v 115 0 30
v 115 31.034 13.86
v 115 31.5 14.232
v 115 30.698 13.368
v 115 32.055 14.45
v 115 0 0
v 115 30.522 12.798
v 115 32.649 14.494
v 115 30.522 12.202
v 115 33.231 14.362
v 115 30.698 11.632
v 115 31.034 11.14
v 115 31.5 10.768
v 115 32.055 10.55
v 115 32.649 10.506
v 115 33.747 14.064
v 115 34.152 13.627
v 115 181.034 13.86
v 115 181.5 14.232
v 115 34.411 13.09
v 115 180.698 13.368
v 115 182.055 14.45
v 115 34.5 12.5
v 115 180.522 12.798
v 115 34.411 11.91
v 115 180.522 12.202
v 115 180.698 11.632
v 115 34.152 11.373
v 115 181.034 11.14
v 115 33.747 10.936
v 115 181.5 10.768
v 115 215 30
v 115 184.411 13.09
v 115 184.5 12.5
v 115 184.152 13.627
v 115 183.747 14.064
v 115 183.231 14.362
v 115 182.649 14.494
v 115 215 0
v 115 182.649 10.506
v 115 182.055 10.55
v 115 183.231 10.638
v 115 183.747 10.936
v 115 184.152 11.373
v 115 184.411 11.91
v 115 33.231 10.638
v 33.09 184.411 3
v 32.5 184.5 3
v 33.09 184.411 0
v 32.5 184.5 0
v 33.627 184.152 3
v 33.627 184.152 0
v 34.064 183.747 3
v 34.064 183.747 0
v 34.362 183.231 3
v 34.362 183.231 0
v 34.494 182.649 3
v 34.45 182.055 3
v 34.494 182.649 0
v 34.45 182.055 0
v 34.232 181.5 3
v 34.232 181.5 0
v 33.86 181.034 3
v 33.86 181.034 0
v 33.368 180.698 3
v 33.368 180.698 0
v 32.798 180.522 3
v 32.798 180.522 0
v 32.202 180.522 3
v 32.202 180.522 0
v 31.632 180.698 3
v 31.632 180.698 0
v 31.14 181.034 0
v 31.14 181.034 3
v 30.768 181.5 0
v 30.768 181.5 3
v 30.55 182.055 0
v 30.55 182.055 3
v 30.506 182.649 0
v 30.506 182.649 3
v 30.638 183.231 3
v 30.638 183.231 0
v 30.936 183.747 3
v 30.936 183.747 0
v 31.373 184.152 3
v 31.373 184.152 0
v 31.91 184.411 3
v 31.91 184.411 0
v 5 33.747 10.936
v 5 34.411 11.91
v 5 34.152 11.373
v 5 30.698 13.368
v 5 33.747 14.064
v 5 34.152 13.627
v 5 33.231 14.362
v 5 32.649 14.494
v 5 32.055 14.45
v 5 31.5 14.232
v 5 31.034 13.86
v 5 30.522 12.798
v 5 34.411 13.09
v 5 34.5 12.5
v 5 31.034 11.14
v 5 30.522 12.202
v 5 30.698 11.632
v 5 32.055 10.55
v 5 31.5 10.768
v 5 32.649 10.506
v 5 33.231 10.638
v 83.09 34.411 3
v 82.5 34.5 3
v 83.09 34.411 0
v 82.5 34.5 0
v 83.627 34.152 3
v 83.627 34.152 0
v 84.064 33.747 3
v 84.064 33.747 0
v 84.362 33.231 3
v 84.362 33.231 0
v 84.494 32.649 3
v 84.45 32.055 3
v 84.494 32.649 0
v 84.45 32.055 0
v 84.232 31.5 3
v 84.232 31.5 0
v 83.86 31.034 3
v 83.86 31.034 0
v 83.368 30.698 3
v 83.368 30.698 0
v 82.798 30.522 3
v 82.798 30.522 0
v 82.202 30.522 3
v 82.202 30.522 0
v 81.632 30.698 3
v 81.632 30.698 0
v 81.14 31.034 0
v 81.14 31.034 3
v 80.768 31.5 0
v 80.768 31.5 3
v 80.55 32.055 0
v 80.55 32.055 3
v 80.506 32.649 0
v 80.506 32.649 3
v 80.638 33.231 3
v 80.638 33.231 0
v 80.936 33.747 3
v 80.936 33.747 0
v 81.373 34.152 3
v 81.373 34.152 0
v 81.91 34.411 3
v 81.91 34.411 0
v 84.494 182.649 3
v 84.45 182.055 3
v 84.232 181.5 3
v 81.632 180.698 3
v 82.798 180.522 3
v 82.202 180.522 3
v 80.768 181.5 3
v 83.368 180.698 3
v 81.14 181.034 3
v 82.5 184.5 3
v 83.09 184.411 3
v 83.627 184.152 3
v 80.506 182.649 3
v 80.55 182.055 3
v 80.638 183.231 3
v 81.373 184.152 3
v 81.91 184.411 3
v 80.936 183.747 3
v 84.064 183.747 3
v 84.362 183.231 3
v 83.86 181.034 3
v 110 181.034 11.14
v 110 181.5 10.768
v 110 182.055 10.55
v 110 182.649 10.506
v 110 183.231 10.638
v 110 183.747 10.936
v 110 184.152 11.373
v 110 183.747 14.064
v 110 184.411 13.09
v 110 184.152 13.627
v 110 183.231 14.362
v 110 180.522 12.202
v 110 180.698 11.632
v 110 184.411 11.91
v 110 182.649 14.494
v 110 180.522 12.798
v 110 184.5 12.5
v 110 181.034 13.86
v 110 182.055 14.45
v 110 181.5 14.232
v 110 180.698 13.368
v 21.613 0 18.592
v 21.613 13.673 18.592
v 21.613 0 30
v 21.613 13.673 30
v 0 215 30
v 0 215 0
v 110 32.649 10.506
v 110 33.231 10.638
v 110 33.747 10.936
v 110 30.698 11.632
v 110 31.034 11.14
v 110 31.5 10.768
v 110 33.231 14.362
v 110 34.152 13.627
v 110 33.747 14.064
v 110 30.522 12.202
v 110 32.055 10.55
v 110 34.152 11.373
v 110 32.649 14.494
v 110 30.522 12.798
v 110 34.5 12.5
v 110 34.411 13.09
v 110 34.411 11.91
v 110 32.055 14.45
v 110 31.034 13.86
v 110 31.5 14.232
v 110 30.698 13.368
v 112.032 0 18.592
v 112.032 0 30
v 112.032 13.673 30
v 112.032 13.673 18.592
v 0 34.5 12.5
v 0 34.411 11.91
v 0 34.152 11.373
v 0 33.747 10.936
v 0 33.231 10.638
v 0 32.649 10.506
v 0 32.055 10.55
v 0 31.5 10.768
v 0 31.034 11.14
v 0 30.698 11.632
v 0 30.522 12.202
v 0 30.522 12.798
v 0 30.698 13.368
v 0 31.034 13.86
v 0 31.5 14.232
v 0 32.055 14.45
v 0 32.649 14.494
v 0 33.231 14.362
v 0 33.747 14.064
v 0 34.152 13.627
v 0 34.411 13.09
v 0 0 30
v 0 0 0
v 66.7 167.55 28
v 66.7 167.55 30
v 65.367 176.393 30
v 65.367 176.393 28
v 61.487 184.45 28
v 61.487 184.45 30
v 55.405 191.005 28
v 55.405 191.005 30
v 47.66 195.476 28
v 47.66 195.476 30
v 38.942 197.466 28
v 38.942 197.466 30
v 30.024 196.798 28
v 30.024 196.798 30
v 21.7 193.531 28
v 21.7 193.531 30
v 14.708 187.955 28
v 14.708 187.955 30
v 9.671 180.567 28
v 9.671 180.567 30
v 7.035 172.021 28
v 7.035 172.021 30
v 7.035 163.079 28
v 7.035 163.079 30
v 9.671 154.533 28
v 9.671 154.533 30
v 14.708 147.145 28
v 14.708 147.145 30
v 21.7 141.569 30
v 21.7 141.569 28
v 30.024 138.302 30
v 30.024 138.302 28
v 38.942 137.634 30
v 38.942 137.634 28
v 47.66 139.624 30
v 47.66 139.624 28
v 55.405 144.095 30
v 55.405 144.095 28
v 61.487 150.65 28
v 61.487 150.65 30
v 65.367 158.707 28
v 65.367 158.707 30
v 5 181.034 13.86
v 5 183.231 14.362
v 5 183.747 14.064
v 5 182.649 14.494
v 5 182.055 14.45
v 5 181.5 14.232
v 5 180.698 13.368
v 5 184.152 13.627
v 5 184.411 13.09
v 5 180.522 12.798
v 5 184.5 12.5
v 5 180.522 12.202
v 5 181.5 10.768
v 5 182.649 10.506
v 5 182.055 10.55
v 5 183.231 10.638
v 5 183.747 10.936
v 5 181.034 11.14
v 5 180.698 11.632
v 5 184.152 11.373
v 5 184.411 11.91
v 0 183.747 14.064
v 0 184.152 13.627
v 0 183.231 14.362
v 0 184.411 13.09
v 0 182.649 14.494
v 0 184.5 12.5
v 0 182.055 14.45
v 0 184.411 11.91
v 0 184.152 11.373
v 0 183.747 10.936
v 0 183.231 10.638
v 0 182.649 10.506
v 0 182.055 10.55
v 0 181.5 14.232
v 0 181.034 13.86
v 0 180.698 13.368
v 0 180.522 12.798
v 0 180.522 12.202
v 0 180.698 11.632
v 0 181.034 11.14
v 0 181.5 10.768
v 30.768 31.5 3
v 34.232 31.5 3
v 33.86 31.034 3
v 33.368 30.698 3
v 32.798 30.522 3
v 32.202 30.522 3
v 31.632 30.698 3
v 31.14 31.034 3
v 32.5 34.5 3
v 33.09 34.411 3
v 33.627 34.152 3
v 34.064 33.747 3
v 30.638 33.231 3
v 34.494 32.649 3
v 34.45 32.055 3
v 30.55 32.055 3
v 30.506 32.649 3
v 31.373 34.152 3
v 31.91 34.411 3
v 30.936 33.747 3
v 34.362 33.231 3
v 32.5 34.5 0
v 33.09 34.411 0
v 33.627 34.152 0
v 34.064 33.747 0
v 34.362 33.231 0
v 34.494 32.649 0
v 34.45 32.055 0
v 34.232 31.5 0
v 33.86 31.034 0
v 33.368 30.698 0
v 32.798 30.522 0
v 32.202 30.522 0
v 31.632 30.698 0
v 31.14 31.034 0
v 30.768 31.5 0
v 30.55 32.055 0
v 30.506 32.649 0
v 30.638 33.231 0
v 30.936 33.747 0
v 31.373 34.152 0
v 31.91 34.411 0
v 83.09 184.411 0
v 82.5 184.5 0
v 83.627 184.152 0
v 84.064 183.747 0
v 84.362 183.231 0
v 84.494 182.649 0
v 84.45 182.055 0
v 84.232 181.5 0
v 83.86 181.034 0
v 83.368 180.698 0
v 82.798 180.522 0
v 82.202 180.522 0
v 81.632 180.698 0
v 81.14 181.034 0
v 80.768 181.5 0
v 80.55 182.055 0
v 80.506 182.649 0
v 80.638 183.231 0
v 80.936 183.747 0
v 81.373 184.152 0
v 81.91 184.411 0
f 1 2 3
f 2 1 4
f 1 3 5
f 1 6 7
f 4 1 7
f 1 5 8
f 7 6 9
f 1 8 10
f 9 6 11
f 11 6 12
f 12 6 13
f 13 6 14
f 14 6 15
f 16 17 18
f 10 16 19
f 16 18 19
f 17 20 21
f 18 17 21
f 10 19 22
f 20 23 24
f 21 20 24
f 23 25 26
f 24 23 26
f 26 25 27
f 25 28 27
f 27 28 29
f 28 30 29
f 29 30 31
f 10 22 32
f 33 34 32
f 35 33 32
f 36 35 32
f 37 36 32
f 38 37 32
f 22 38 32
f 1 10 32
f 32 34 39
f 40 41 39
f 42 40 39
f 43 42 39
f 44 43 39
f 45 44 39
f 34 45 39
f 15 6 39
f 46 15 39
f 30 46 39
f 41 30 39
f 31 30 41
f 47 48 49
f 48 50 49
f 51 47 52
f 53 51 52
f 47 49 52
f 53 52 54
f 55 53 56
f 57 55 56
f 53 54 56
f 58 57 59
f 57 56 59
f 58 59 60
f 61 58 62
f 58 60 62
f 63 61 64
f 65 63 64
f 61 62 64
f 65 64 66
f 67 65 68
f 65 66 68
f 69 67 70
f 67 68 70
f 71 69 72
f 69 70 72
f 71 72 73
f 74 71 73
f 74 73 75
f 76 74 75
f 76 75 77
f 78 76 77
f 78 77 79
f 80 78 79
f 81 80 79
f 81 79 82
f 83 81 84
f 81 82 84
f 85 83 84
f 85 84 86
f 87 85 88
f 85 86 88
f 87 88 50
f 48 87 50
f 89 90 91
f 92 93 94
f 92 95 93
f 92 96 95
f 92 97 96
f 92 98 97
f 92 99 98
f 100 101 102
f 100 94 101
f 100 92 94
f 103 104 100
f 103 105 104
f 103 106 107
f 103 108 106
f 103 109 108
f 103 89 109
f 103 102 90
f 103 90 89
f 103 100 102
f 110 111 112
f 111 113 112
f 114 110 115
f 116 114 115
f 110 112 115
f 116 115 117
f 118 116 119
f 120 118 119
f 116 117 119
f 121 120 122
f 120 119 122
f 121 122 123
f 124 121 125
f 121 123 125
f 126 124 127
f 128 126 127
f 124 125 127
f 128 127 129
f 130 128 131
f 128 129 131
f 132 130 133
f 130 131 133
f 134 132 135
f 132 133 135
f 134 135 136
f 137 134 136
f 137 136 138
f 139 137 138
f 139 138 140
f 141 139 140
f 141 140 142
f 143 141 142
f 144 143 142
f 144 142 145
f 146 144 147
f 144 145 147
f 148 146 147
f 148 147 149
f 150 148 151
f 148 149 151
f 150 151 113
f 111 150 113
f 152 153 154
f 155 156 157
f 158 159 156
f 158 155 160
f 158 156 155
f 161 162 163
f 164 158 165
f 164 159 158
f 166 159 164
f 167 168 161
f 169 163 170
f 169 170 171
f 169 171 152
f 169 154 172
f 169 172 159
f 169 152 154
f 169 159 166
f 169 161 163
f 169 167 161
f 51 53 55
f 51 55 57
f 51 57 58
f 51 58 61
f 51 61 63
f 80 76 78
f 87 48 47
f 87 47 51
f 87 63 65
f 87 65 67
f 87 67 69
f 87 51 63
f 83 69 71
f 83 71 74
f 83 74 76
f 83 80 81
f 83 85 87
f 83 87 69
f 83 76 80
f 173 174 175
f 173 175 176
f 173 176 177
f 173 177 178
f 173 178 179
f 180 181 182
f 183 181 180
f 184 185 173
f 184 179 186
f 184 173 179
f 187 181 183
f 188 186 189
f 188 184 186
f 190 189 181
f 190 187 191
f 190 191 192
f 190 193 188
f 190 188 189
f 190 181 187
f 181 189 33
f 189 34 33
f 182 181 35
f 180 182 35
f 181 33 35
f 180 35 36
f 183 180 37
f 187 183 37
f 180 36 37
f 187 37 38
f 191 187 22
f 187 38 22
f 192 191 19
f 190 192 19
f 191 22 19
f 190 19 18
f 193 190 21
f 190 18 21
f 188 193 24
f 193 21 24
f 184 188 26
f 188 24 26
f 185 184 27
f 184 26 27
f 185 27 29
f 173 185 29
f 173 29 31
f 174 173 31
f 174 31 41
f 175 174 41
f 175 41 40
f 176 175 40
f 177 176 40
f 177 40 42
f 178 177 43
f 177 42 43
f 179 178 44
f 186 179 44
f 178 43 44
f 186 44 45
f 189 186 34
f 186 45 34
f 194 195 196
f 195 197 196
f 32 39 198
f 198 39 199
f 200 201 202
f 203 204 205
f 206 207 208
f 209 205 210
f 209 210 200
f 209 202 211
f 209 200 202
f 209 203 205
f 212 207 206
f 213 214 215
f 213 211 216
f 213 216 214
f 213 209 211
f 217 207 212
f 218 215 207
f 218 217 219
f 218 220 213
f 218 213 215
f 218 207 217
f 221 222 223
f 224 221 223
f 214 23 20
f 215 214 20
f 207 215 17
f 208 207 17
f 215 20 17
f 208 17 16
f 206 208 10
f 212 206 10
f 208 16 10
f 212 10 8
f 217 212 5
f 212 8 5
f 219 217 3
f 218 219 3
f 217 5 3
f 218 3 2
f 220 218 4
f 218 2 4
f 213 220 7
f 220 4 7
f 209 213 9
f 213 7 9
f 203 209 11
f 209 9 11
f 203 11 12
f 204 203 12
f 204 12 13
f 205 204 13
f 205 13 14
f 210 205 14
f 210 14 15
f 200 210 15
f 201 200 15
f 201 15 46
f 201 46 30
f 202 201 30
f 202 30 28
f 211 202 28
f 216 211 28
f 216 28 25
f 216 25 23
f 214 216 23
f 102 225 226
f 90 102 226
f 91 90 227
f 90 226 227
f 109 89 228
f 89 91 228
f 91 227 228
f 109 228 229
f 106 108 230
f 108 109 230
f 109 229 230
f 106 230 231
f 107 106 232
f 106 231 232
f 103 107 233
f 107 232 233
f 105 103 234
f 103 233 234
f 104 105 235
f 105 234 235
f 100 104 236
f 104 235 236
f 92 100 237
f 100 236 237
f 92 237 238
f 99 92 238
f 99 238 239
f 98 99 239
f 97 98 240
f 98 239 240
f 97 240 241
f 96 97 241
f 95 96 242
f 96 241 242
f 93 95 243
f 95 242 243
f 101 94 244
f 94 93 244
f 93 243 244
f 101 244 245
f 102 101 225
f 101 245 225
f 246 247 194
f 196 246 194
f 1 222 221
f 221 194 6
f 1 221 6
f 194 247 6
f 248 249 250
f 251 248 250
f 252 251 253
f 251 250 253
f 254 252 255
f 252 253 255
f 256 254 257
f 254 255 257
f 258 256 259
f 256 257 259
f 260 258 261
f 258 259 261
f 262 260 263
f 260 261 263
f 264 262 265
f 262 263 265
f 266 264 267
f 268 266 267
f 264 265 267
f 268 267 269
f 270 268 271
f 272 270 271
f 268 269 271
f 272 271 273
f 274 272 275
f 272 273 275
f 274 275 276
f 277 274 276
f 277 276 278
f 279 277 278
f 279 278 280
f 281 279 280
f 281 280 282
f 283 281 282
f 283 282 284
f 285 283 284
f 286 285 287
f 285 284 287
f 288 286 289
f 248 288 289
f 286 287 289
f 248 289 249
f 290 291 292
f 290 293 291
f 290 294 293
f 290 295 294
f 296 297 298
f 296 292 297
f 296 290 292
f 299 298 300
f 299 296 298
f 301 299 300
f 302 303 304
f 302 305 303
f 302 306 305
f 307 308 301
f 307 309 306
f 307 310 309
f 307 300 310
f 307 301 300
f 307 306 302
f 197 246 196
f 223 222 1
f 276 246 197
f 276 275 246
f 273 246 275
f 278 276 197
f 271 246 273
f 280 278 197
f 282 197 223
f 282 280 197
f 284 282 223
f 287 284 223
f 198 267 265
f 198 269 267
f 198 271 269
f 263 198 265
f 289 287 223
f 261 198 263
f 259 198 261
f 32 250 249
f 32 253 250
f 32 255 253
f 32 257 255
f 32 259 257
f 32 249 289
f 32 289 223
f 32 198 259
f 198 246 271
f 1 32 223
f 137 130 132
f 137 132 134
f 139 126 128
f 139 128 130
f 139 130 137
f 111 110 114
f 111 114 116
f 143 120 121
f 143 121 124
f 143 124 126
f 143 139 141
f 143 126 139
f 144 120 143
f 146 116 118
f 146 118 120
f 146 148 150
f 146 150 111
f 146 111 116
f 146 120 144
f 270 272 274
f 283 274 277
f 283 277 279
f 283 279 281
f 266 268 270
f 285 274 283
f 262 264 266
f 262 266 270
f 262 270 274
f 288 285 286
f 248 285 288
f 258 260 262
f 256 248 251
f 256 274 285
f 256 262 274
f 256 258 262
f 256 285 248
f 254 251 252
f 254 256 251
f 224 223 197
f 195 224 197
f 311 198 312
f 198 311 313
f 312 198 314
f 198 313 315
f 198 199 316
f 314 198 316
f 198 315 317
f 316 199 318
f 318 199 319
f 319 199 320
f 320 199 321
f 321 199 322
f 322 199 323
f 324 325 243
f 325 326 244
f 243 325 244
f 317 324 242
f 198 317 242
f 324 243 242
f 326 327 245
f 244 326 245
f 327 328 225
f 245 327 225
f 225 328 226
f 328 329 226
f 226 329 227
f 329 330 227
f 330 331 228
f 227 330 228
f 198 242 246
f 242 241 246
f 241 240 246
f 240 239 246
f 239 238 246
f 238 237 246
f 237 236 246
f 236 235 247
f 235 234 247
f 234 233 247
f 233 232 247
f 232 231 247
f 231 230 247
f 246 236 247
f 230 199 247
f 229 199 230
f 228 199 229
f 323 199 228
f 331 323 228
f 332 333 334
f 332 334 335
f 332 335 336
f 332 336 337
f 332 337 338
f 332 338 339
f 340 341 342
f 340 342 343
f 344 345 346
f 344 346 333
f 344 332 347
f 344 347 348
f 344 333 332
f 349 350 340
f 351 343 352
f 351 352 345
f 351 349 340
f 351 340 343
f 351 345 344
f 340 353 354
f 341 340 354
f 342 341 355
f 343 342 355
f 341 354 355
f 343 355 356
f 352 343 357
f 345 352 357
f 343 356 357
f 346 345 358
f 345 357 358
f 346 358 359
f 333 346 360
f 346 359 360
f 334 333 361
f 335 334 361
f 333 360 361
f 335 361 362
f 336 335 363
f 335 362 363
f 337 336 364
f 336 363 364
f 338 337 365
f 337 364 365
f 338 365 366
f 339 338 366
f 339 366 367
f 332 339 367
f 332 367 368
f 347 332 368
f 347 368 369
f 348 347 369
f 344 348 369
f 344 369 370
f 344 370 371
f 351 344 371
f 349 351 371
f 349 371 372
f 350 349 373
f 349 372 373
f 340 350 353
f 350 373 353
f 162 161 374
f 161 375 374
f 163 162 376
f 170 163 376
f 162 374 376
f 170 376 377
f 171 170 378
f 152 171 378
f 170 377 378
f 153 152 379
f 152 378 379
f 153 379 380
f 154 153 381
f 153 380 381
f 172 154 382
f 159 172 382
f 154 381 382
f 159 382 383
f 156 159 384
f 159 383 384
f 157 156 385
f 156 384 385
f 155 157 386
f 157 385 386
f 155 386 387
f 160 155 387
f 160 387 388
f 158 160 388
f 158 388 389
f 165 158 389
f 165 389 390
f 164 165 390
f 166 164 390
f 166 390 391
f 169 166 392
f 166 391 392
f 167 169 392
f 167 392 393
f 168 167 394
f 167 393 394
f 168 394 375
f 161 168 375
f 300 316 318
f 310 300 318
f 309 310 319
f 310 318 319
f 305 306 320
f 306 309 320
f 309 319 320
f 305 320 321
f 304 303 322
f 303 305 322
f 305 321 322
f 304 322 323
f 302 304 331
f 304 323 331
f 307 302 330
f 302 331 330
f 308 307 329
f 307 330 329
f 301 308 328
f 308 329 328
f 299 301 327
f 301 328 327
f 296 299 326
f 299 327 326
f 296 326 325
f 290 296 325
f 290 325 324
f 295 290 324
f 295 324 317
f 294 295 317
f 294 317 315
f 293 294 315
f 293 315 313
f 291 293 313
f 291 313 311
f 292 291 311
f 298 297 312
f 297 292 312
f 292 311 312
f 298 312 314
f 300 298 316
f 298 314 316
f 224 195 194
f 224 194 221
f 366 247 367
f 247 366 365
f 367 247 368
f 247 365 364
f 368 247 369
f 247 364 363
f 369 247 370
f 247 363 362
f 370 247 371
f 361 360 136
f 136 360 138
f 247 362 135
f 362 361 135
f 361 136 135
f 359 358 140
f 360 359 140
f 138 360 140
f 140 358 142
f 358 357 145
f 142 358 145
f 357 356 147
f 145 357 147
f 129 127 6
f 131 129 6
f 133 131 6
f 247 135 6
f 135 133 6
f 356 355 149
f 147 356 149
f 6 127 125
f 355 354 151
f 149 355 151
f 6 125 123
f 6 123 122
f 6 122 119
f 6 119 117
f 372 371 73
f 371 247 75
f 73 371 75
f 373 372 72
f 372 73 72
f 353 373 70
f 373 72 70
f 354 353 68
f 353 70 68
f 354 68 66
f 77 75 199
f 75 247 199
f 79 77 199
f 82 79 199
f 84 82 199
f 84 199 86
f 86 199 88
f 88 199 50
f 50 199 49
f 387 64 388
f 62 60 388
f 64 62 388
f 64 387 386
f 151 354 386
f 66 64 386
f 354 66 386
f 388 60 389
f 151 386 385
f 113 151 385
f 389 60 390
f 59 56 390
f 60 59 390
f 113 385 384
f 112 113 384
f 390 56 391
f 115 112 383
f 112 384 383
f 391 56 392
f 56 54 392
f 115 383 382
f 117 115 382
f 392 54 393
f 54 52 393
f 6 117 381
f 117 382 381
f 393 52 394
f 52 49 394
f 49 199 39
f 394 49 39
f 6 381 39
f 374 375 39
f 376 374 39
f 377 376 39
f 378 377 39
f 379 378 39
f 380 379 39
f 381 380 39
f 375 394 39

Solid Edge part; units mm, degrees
sketch "Sketch1" plane through (0, 0, 0) normal (0, 0, 1) x (1, 0, 0)
  line L0 (0, 0) -> (115, 0)
  line L1 (115, 0) -> (115, 215)
  line L2 (115, 215) -> (0, 215)
  line L3 (0, 215) -> (0, 0)
  dimension "D1" = 115
  dimension "D2" = 215
extrude "Protrusion1" add sketch "Sketch1" along normal blind 30
sketch "Sketch2" plane through (57.5, 107.5, 30) normal (0, 0, 1) x (1, 0, 0)
  circle A0 centre (-20.8, 60.05) radius 30
  dimension "D1" = 36.7
  dimension "D2" = 47.45
  dimension "D3" = 60
extrude "ExtrudedCutout_1" cut sketch "Sketch2" against normal blind 2
sketch "Sketch3" plane through (57.5, 107.5, 0) normal (0, 0, -1) x (0, 1, 0)
  circle A0 centre (-75, -25) radius 2
  circle A1 centre (75, -25) radius 2
  circle A2 centre (75, 25) radius 2
  circle A3 centre (-75, 25) radius 2
  dimension "D1" = 32.5
  dimension "D2" = 32.5
  dimension "D3" = 50
  dimension "D4" = 150
  dimension "D5" = 4
extrude "ExtrudedCutout_2" cut sketch "Sketch3" against normal blind 3
sketch "Sketch4" plane through (57.5, 107.5, 30) normal (0, 0, 1) x (0, 1, 0)
  line L0 (-107.5, -54.5317) -> (-93.8266, -54.5317)
  line L1 (-93.8266, -54.5317) -> (-93.8266, 35.8867)
  line L2 (-93.8266, 35.8867) -> (-107.5, 35.8867)
  line L3 (-107.5, 35.8867) -> (-107.5, -54.5317)
extrude "ExtrudedCutout_3" cut sketch "Sketch4" against normal blind 11.4081
sketch "Sketch5" plane through (115, 107.5, 15) normal (1, 0, 0) x (0, 1, 0)
  circle A0 centre (-75, -2.5) radius 2
  circle A1 centre (75, -2.5) radius 2
  dimension "D1" = 4
  dimension "D2" = 12.5
extrude "ExtrudedCutout_4" cut sketch "Sketch5" against normal blind 5
mirror "Mirror1" about plane through (57.5, 0, 0) normal (1, 0, 0) of "ExtrudedCutout_4"
